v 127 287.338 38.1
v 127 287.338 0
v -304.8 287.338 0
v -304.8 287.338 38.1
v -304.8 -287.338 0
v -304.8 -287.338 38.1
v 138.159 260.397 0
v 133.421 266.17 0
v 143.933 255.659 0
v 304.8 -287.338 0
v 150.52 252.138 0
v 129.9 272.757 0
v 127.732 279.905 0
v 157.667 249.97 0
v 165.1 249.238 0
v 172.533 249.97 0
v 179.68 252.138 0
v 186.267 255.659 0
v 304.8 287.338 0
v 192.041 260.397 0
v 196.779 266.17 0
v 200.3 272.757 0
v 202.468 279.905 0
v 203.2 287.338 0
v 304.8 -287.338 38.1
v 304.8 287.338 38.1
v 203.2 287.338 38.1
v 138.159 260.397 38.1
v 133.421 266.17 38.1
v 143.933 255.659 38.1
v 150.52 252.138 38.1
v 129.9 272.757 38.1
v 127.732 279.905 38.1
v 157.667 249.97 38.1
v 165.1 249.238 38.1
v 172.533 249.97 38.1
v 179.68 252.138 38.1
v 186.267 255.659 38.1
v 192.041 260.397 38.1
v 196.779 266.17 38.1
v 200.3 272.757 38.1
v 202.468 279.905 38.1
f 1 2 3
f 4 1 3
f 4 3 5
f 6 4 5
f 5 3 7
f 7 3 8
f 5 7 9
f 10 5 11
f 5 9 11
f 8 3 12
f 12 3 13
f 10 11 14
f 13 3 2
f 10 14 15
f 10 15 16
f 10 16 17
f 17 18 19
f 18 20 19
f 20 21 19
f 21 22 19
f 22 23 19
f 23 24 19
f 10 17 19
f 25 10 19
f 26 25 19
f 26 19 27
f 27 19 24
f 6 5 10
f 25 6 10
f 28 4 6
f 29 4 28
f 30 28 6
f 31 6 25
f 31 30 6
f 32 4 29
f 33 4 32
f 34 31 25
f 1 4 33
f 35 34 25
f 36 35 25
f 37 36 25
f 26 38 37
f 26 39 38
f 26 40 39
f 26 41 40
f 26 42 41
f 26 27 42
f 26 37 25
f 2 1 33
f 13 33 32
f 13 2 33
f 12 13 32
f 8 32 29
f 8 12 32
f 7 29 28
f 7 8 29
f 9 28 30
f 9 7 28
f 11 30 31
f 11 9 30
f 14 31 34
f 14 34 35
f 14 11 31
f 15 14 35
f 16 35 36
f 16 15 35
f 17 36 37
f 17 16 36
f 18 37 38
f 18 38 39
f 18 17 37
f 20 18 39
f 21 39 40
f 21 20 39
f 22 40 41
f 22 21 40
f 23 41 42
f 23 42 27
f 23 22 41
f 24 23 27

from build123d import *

# Parameters (mm, degrees)
F1_DEPTH = 38.1
F2_DEPTH = 38.1


with BuildPart() as f1:
    # F0 (on Top) → F1 (new body)
    with BuildSketch(Plane.XY):
        with BuildLine():
            Line((304.8, -287.3375), (304.8, 287.3375))
            Line((304.8, 287.3375), (203.2, 287.3375))
            ThreePointArc((203.2, 287.3375), (165.1, 249.2375), (127, 287.3375))
            Line((127, 287.3375), (-304.8, 287.3375))
            Line((-304.8, 287.3375), (-304.8, -287.3375))
            Line((-304.8, -287.3375), (304.8, -287.3375))
        make_face()
        with BuildLine():
            ThreePointArc((127, 287.3375), (165.1, 249.2375), (203.2, 287.3375))
            Line((203.2, 287.3375), (127, 287.3375))
        make_face()
    extrude(amount=F1_DEPTH)

    # F0 (on Top) → F2 (cut)
    with BuildSketch(Plane.XY):
        with BuildLine():
            ThreePointArc((127, 287.3375), (165.1, 249.2375), (203.2, 287.3375))
            Line((203.2, 287.3375), (127, 287.3375))
        make_face()
    extrude(amount=F2_DEPTH, mode=Mode.SUBTRACT)


solid = f1.part
